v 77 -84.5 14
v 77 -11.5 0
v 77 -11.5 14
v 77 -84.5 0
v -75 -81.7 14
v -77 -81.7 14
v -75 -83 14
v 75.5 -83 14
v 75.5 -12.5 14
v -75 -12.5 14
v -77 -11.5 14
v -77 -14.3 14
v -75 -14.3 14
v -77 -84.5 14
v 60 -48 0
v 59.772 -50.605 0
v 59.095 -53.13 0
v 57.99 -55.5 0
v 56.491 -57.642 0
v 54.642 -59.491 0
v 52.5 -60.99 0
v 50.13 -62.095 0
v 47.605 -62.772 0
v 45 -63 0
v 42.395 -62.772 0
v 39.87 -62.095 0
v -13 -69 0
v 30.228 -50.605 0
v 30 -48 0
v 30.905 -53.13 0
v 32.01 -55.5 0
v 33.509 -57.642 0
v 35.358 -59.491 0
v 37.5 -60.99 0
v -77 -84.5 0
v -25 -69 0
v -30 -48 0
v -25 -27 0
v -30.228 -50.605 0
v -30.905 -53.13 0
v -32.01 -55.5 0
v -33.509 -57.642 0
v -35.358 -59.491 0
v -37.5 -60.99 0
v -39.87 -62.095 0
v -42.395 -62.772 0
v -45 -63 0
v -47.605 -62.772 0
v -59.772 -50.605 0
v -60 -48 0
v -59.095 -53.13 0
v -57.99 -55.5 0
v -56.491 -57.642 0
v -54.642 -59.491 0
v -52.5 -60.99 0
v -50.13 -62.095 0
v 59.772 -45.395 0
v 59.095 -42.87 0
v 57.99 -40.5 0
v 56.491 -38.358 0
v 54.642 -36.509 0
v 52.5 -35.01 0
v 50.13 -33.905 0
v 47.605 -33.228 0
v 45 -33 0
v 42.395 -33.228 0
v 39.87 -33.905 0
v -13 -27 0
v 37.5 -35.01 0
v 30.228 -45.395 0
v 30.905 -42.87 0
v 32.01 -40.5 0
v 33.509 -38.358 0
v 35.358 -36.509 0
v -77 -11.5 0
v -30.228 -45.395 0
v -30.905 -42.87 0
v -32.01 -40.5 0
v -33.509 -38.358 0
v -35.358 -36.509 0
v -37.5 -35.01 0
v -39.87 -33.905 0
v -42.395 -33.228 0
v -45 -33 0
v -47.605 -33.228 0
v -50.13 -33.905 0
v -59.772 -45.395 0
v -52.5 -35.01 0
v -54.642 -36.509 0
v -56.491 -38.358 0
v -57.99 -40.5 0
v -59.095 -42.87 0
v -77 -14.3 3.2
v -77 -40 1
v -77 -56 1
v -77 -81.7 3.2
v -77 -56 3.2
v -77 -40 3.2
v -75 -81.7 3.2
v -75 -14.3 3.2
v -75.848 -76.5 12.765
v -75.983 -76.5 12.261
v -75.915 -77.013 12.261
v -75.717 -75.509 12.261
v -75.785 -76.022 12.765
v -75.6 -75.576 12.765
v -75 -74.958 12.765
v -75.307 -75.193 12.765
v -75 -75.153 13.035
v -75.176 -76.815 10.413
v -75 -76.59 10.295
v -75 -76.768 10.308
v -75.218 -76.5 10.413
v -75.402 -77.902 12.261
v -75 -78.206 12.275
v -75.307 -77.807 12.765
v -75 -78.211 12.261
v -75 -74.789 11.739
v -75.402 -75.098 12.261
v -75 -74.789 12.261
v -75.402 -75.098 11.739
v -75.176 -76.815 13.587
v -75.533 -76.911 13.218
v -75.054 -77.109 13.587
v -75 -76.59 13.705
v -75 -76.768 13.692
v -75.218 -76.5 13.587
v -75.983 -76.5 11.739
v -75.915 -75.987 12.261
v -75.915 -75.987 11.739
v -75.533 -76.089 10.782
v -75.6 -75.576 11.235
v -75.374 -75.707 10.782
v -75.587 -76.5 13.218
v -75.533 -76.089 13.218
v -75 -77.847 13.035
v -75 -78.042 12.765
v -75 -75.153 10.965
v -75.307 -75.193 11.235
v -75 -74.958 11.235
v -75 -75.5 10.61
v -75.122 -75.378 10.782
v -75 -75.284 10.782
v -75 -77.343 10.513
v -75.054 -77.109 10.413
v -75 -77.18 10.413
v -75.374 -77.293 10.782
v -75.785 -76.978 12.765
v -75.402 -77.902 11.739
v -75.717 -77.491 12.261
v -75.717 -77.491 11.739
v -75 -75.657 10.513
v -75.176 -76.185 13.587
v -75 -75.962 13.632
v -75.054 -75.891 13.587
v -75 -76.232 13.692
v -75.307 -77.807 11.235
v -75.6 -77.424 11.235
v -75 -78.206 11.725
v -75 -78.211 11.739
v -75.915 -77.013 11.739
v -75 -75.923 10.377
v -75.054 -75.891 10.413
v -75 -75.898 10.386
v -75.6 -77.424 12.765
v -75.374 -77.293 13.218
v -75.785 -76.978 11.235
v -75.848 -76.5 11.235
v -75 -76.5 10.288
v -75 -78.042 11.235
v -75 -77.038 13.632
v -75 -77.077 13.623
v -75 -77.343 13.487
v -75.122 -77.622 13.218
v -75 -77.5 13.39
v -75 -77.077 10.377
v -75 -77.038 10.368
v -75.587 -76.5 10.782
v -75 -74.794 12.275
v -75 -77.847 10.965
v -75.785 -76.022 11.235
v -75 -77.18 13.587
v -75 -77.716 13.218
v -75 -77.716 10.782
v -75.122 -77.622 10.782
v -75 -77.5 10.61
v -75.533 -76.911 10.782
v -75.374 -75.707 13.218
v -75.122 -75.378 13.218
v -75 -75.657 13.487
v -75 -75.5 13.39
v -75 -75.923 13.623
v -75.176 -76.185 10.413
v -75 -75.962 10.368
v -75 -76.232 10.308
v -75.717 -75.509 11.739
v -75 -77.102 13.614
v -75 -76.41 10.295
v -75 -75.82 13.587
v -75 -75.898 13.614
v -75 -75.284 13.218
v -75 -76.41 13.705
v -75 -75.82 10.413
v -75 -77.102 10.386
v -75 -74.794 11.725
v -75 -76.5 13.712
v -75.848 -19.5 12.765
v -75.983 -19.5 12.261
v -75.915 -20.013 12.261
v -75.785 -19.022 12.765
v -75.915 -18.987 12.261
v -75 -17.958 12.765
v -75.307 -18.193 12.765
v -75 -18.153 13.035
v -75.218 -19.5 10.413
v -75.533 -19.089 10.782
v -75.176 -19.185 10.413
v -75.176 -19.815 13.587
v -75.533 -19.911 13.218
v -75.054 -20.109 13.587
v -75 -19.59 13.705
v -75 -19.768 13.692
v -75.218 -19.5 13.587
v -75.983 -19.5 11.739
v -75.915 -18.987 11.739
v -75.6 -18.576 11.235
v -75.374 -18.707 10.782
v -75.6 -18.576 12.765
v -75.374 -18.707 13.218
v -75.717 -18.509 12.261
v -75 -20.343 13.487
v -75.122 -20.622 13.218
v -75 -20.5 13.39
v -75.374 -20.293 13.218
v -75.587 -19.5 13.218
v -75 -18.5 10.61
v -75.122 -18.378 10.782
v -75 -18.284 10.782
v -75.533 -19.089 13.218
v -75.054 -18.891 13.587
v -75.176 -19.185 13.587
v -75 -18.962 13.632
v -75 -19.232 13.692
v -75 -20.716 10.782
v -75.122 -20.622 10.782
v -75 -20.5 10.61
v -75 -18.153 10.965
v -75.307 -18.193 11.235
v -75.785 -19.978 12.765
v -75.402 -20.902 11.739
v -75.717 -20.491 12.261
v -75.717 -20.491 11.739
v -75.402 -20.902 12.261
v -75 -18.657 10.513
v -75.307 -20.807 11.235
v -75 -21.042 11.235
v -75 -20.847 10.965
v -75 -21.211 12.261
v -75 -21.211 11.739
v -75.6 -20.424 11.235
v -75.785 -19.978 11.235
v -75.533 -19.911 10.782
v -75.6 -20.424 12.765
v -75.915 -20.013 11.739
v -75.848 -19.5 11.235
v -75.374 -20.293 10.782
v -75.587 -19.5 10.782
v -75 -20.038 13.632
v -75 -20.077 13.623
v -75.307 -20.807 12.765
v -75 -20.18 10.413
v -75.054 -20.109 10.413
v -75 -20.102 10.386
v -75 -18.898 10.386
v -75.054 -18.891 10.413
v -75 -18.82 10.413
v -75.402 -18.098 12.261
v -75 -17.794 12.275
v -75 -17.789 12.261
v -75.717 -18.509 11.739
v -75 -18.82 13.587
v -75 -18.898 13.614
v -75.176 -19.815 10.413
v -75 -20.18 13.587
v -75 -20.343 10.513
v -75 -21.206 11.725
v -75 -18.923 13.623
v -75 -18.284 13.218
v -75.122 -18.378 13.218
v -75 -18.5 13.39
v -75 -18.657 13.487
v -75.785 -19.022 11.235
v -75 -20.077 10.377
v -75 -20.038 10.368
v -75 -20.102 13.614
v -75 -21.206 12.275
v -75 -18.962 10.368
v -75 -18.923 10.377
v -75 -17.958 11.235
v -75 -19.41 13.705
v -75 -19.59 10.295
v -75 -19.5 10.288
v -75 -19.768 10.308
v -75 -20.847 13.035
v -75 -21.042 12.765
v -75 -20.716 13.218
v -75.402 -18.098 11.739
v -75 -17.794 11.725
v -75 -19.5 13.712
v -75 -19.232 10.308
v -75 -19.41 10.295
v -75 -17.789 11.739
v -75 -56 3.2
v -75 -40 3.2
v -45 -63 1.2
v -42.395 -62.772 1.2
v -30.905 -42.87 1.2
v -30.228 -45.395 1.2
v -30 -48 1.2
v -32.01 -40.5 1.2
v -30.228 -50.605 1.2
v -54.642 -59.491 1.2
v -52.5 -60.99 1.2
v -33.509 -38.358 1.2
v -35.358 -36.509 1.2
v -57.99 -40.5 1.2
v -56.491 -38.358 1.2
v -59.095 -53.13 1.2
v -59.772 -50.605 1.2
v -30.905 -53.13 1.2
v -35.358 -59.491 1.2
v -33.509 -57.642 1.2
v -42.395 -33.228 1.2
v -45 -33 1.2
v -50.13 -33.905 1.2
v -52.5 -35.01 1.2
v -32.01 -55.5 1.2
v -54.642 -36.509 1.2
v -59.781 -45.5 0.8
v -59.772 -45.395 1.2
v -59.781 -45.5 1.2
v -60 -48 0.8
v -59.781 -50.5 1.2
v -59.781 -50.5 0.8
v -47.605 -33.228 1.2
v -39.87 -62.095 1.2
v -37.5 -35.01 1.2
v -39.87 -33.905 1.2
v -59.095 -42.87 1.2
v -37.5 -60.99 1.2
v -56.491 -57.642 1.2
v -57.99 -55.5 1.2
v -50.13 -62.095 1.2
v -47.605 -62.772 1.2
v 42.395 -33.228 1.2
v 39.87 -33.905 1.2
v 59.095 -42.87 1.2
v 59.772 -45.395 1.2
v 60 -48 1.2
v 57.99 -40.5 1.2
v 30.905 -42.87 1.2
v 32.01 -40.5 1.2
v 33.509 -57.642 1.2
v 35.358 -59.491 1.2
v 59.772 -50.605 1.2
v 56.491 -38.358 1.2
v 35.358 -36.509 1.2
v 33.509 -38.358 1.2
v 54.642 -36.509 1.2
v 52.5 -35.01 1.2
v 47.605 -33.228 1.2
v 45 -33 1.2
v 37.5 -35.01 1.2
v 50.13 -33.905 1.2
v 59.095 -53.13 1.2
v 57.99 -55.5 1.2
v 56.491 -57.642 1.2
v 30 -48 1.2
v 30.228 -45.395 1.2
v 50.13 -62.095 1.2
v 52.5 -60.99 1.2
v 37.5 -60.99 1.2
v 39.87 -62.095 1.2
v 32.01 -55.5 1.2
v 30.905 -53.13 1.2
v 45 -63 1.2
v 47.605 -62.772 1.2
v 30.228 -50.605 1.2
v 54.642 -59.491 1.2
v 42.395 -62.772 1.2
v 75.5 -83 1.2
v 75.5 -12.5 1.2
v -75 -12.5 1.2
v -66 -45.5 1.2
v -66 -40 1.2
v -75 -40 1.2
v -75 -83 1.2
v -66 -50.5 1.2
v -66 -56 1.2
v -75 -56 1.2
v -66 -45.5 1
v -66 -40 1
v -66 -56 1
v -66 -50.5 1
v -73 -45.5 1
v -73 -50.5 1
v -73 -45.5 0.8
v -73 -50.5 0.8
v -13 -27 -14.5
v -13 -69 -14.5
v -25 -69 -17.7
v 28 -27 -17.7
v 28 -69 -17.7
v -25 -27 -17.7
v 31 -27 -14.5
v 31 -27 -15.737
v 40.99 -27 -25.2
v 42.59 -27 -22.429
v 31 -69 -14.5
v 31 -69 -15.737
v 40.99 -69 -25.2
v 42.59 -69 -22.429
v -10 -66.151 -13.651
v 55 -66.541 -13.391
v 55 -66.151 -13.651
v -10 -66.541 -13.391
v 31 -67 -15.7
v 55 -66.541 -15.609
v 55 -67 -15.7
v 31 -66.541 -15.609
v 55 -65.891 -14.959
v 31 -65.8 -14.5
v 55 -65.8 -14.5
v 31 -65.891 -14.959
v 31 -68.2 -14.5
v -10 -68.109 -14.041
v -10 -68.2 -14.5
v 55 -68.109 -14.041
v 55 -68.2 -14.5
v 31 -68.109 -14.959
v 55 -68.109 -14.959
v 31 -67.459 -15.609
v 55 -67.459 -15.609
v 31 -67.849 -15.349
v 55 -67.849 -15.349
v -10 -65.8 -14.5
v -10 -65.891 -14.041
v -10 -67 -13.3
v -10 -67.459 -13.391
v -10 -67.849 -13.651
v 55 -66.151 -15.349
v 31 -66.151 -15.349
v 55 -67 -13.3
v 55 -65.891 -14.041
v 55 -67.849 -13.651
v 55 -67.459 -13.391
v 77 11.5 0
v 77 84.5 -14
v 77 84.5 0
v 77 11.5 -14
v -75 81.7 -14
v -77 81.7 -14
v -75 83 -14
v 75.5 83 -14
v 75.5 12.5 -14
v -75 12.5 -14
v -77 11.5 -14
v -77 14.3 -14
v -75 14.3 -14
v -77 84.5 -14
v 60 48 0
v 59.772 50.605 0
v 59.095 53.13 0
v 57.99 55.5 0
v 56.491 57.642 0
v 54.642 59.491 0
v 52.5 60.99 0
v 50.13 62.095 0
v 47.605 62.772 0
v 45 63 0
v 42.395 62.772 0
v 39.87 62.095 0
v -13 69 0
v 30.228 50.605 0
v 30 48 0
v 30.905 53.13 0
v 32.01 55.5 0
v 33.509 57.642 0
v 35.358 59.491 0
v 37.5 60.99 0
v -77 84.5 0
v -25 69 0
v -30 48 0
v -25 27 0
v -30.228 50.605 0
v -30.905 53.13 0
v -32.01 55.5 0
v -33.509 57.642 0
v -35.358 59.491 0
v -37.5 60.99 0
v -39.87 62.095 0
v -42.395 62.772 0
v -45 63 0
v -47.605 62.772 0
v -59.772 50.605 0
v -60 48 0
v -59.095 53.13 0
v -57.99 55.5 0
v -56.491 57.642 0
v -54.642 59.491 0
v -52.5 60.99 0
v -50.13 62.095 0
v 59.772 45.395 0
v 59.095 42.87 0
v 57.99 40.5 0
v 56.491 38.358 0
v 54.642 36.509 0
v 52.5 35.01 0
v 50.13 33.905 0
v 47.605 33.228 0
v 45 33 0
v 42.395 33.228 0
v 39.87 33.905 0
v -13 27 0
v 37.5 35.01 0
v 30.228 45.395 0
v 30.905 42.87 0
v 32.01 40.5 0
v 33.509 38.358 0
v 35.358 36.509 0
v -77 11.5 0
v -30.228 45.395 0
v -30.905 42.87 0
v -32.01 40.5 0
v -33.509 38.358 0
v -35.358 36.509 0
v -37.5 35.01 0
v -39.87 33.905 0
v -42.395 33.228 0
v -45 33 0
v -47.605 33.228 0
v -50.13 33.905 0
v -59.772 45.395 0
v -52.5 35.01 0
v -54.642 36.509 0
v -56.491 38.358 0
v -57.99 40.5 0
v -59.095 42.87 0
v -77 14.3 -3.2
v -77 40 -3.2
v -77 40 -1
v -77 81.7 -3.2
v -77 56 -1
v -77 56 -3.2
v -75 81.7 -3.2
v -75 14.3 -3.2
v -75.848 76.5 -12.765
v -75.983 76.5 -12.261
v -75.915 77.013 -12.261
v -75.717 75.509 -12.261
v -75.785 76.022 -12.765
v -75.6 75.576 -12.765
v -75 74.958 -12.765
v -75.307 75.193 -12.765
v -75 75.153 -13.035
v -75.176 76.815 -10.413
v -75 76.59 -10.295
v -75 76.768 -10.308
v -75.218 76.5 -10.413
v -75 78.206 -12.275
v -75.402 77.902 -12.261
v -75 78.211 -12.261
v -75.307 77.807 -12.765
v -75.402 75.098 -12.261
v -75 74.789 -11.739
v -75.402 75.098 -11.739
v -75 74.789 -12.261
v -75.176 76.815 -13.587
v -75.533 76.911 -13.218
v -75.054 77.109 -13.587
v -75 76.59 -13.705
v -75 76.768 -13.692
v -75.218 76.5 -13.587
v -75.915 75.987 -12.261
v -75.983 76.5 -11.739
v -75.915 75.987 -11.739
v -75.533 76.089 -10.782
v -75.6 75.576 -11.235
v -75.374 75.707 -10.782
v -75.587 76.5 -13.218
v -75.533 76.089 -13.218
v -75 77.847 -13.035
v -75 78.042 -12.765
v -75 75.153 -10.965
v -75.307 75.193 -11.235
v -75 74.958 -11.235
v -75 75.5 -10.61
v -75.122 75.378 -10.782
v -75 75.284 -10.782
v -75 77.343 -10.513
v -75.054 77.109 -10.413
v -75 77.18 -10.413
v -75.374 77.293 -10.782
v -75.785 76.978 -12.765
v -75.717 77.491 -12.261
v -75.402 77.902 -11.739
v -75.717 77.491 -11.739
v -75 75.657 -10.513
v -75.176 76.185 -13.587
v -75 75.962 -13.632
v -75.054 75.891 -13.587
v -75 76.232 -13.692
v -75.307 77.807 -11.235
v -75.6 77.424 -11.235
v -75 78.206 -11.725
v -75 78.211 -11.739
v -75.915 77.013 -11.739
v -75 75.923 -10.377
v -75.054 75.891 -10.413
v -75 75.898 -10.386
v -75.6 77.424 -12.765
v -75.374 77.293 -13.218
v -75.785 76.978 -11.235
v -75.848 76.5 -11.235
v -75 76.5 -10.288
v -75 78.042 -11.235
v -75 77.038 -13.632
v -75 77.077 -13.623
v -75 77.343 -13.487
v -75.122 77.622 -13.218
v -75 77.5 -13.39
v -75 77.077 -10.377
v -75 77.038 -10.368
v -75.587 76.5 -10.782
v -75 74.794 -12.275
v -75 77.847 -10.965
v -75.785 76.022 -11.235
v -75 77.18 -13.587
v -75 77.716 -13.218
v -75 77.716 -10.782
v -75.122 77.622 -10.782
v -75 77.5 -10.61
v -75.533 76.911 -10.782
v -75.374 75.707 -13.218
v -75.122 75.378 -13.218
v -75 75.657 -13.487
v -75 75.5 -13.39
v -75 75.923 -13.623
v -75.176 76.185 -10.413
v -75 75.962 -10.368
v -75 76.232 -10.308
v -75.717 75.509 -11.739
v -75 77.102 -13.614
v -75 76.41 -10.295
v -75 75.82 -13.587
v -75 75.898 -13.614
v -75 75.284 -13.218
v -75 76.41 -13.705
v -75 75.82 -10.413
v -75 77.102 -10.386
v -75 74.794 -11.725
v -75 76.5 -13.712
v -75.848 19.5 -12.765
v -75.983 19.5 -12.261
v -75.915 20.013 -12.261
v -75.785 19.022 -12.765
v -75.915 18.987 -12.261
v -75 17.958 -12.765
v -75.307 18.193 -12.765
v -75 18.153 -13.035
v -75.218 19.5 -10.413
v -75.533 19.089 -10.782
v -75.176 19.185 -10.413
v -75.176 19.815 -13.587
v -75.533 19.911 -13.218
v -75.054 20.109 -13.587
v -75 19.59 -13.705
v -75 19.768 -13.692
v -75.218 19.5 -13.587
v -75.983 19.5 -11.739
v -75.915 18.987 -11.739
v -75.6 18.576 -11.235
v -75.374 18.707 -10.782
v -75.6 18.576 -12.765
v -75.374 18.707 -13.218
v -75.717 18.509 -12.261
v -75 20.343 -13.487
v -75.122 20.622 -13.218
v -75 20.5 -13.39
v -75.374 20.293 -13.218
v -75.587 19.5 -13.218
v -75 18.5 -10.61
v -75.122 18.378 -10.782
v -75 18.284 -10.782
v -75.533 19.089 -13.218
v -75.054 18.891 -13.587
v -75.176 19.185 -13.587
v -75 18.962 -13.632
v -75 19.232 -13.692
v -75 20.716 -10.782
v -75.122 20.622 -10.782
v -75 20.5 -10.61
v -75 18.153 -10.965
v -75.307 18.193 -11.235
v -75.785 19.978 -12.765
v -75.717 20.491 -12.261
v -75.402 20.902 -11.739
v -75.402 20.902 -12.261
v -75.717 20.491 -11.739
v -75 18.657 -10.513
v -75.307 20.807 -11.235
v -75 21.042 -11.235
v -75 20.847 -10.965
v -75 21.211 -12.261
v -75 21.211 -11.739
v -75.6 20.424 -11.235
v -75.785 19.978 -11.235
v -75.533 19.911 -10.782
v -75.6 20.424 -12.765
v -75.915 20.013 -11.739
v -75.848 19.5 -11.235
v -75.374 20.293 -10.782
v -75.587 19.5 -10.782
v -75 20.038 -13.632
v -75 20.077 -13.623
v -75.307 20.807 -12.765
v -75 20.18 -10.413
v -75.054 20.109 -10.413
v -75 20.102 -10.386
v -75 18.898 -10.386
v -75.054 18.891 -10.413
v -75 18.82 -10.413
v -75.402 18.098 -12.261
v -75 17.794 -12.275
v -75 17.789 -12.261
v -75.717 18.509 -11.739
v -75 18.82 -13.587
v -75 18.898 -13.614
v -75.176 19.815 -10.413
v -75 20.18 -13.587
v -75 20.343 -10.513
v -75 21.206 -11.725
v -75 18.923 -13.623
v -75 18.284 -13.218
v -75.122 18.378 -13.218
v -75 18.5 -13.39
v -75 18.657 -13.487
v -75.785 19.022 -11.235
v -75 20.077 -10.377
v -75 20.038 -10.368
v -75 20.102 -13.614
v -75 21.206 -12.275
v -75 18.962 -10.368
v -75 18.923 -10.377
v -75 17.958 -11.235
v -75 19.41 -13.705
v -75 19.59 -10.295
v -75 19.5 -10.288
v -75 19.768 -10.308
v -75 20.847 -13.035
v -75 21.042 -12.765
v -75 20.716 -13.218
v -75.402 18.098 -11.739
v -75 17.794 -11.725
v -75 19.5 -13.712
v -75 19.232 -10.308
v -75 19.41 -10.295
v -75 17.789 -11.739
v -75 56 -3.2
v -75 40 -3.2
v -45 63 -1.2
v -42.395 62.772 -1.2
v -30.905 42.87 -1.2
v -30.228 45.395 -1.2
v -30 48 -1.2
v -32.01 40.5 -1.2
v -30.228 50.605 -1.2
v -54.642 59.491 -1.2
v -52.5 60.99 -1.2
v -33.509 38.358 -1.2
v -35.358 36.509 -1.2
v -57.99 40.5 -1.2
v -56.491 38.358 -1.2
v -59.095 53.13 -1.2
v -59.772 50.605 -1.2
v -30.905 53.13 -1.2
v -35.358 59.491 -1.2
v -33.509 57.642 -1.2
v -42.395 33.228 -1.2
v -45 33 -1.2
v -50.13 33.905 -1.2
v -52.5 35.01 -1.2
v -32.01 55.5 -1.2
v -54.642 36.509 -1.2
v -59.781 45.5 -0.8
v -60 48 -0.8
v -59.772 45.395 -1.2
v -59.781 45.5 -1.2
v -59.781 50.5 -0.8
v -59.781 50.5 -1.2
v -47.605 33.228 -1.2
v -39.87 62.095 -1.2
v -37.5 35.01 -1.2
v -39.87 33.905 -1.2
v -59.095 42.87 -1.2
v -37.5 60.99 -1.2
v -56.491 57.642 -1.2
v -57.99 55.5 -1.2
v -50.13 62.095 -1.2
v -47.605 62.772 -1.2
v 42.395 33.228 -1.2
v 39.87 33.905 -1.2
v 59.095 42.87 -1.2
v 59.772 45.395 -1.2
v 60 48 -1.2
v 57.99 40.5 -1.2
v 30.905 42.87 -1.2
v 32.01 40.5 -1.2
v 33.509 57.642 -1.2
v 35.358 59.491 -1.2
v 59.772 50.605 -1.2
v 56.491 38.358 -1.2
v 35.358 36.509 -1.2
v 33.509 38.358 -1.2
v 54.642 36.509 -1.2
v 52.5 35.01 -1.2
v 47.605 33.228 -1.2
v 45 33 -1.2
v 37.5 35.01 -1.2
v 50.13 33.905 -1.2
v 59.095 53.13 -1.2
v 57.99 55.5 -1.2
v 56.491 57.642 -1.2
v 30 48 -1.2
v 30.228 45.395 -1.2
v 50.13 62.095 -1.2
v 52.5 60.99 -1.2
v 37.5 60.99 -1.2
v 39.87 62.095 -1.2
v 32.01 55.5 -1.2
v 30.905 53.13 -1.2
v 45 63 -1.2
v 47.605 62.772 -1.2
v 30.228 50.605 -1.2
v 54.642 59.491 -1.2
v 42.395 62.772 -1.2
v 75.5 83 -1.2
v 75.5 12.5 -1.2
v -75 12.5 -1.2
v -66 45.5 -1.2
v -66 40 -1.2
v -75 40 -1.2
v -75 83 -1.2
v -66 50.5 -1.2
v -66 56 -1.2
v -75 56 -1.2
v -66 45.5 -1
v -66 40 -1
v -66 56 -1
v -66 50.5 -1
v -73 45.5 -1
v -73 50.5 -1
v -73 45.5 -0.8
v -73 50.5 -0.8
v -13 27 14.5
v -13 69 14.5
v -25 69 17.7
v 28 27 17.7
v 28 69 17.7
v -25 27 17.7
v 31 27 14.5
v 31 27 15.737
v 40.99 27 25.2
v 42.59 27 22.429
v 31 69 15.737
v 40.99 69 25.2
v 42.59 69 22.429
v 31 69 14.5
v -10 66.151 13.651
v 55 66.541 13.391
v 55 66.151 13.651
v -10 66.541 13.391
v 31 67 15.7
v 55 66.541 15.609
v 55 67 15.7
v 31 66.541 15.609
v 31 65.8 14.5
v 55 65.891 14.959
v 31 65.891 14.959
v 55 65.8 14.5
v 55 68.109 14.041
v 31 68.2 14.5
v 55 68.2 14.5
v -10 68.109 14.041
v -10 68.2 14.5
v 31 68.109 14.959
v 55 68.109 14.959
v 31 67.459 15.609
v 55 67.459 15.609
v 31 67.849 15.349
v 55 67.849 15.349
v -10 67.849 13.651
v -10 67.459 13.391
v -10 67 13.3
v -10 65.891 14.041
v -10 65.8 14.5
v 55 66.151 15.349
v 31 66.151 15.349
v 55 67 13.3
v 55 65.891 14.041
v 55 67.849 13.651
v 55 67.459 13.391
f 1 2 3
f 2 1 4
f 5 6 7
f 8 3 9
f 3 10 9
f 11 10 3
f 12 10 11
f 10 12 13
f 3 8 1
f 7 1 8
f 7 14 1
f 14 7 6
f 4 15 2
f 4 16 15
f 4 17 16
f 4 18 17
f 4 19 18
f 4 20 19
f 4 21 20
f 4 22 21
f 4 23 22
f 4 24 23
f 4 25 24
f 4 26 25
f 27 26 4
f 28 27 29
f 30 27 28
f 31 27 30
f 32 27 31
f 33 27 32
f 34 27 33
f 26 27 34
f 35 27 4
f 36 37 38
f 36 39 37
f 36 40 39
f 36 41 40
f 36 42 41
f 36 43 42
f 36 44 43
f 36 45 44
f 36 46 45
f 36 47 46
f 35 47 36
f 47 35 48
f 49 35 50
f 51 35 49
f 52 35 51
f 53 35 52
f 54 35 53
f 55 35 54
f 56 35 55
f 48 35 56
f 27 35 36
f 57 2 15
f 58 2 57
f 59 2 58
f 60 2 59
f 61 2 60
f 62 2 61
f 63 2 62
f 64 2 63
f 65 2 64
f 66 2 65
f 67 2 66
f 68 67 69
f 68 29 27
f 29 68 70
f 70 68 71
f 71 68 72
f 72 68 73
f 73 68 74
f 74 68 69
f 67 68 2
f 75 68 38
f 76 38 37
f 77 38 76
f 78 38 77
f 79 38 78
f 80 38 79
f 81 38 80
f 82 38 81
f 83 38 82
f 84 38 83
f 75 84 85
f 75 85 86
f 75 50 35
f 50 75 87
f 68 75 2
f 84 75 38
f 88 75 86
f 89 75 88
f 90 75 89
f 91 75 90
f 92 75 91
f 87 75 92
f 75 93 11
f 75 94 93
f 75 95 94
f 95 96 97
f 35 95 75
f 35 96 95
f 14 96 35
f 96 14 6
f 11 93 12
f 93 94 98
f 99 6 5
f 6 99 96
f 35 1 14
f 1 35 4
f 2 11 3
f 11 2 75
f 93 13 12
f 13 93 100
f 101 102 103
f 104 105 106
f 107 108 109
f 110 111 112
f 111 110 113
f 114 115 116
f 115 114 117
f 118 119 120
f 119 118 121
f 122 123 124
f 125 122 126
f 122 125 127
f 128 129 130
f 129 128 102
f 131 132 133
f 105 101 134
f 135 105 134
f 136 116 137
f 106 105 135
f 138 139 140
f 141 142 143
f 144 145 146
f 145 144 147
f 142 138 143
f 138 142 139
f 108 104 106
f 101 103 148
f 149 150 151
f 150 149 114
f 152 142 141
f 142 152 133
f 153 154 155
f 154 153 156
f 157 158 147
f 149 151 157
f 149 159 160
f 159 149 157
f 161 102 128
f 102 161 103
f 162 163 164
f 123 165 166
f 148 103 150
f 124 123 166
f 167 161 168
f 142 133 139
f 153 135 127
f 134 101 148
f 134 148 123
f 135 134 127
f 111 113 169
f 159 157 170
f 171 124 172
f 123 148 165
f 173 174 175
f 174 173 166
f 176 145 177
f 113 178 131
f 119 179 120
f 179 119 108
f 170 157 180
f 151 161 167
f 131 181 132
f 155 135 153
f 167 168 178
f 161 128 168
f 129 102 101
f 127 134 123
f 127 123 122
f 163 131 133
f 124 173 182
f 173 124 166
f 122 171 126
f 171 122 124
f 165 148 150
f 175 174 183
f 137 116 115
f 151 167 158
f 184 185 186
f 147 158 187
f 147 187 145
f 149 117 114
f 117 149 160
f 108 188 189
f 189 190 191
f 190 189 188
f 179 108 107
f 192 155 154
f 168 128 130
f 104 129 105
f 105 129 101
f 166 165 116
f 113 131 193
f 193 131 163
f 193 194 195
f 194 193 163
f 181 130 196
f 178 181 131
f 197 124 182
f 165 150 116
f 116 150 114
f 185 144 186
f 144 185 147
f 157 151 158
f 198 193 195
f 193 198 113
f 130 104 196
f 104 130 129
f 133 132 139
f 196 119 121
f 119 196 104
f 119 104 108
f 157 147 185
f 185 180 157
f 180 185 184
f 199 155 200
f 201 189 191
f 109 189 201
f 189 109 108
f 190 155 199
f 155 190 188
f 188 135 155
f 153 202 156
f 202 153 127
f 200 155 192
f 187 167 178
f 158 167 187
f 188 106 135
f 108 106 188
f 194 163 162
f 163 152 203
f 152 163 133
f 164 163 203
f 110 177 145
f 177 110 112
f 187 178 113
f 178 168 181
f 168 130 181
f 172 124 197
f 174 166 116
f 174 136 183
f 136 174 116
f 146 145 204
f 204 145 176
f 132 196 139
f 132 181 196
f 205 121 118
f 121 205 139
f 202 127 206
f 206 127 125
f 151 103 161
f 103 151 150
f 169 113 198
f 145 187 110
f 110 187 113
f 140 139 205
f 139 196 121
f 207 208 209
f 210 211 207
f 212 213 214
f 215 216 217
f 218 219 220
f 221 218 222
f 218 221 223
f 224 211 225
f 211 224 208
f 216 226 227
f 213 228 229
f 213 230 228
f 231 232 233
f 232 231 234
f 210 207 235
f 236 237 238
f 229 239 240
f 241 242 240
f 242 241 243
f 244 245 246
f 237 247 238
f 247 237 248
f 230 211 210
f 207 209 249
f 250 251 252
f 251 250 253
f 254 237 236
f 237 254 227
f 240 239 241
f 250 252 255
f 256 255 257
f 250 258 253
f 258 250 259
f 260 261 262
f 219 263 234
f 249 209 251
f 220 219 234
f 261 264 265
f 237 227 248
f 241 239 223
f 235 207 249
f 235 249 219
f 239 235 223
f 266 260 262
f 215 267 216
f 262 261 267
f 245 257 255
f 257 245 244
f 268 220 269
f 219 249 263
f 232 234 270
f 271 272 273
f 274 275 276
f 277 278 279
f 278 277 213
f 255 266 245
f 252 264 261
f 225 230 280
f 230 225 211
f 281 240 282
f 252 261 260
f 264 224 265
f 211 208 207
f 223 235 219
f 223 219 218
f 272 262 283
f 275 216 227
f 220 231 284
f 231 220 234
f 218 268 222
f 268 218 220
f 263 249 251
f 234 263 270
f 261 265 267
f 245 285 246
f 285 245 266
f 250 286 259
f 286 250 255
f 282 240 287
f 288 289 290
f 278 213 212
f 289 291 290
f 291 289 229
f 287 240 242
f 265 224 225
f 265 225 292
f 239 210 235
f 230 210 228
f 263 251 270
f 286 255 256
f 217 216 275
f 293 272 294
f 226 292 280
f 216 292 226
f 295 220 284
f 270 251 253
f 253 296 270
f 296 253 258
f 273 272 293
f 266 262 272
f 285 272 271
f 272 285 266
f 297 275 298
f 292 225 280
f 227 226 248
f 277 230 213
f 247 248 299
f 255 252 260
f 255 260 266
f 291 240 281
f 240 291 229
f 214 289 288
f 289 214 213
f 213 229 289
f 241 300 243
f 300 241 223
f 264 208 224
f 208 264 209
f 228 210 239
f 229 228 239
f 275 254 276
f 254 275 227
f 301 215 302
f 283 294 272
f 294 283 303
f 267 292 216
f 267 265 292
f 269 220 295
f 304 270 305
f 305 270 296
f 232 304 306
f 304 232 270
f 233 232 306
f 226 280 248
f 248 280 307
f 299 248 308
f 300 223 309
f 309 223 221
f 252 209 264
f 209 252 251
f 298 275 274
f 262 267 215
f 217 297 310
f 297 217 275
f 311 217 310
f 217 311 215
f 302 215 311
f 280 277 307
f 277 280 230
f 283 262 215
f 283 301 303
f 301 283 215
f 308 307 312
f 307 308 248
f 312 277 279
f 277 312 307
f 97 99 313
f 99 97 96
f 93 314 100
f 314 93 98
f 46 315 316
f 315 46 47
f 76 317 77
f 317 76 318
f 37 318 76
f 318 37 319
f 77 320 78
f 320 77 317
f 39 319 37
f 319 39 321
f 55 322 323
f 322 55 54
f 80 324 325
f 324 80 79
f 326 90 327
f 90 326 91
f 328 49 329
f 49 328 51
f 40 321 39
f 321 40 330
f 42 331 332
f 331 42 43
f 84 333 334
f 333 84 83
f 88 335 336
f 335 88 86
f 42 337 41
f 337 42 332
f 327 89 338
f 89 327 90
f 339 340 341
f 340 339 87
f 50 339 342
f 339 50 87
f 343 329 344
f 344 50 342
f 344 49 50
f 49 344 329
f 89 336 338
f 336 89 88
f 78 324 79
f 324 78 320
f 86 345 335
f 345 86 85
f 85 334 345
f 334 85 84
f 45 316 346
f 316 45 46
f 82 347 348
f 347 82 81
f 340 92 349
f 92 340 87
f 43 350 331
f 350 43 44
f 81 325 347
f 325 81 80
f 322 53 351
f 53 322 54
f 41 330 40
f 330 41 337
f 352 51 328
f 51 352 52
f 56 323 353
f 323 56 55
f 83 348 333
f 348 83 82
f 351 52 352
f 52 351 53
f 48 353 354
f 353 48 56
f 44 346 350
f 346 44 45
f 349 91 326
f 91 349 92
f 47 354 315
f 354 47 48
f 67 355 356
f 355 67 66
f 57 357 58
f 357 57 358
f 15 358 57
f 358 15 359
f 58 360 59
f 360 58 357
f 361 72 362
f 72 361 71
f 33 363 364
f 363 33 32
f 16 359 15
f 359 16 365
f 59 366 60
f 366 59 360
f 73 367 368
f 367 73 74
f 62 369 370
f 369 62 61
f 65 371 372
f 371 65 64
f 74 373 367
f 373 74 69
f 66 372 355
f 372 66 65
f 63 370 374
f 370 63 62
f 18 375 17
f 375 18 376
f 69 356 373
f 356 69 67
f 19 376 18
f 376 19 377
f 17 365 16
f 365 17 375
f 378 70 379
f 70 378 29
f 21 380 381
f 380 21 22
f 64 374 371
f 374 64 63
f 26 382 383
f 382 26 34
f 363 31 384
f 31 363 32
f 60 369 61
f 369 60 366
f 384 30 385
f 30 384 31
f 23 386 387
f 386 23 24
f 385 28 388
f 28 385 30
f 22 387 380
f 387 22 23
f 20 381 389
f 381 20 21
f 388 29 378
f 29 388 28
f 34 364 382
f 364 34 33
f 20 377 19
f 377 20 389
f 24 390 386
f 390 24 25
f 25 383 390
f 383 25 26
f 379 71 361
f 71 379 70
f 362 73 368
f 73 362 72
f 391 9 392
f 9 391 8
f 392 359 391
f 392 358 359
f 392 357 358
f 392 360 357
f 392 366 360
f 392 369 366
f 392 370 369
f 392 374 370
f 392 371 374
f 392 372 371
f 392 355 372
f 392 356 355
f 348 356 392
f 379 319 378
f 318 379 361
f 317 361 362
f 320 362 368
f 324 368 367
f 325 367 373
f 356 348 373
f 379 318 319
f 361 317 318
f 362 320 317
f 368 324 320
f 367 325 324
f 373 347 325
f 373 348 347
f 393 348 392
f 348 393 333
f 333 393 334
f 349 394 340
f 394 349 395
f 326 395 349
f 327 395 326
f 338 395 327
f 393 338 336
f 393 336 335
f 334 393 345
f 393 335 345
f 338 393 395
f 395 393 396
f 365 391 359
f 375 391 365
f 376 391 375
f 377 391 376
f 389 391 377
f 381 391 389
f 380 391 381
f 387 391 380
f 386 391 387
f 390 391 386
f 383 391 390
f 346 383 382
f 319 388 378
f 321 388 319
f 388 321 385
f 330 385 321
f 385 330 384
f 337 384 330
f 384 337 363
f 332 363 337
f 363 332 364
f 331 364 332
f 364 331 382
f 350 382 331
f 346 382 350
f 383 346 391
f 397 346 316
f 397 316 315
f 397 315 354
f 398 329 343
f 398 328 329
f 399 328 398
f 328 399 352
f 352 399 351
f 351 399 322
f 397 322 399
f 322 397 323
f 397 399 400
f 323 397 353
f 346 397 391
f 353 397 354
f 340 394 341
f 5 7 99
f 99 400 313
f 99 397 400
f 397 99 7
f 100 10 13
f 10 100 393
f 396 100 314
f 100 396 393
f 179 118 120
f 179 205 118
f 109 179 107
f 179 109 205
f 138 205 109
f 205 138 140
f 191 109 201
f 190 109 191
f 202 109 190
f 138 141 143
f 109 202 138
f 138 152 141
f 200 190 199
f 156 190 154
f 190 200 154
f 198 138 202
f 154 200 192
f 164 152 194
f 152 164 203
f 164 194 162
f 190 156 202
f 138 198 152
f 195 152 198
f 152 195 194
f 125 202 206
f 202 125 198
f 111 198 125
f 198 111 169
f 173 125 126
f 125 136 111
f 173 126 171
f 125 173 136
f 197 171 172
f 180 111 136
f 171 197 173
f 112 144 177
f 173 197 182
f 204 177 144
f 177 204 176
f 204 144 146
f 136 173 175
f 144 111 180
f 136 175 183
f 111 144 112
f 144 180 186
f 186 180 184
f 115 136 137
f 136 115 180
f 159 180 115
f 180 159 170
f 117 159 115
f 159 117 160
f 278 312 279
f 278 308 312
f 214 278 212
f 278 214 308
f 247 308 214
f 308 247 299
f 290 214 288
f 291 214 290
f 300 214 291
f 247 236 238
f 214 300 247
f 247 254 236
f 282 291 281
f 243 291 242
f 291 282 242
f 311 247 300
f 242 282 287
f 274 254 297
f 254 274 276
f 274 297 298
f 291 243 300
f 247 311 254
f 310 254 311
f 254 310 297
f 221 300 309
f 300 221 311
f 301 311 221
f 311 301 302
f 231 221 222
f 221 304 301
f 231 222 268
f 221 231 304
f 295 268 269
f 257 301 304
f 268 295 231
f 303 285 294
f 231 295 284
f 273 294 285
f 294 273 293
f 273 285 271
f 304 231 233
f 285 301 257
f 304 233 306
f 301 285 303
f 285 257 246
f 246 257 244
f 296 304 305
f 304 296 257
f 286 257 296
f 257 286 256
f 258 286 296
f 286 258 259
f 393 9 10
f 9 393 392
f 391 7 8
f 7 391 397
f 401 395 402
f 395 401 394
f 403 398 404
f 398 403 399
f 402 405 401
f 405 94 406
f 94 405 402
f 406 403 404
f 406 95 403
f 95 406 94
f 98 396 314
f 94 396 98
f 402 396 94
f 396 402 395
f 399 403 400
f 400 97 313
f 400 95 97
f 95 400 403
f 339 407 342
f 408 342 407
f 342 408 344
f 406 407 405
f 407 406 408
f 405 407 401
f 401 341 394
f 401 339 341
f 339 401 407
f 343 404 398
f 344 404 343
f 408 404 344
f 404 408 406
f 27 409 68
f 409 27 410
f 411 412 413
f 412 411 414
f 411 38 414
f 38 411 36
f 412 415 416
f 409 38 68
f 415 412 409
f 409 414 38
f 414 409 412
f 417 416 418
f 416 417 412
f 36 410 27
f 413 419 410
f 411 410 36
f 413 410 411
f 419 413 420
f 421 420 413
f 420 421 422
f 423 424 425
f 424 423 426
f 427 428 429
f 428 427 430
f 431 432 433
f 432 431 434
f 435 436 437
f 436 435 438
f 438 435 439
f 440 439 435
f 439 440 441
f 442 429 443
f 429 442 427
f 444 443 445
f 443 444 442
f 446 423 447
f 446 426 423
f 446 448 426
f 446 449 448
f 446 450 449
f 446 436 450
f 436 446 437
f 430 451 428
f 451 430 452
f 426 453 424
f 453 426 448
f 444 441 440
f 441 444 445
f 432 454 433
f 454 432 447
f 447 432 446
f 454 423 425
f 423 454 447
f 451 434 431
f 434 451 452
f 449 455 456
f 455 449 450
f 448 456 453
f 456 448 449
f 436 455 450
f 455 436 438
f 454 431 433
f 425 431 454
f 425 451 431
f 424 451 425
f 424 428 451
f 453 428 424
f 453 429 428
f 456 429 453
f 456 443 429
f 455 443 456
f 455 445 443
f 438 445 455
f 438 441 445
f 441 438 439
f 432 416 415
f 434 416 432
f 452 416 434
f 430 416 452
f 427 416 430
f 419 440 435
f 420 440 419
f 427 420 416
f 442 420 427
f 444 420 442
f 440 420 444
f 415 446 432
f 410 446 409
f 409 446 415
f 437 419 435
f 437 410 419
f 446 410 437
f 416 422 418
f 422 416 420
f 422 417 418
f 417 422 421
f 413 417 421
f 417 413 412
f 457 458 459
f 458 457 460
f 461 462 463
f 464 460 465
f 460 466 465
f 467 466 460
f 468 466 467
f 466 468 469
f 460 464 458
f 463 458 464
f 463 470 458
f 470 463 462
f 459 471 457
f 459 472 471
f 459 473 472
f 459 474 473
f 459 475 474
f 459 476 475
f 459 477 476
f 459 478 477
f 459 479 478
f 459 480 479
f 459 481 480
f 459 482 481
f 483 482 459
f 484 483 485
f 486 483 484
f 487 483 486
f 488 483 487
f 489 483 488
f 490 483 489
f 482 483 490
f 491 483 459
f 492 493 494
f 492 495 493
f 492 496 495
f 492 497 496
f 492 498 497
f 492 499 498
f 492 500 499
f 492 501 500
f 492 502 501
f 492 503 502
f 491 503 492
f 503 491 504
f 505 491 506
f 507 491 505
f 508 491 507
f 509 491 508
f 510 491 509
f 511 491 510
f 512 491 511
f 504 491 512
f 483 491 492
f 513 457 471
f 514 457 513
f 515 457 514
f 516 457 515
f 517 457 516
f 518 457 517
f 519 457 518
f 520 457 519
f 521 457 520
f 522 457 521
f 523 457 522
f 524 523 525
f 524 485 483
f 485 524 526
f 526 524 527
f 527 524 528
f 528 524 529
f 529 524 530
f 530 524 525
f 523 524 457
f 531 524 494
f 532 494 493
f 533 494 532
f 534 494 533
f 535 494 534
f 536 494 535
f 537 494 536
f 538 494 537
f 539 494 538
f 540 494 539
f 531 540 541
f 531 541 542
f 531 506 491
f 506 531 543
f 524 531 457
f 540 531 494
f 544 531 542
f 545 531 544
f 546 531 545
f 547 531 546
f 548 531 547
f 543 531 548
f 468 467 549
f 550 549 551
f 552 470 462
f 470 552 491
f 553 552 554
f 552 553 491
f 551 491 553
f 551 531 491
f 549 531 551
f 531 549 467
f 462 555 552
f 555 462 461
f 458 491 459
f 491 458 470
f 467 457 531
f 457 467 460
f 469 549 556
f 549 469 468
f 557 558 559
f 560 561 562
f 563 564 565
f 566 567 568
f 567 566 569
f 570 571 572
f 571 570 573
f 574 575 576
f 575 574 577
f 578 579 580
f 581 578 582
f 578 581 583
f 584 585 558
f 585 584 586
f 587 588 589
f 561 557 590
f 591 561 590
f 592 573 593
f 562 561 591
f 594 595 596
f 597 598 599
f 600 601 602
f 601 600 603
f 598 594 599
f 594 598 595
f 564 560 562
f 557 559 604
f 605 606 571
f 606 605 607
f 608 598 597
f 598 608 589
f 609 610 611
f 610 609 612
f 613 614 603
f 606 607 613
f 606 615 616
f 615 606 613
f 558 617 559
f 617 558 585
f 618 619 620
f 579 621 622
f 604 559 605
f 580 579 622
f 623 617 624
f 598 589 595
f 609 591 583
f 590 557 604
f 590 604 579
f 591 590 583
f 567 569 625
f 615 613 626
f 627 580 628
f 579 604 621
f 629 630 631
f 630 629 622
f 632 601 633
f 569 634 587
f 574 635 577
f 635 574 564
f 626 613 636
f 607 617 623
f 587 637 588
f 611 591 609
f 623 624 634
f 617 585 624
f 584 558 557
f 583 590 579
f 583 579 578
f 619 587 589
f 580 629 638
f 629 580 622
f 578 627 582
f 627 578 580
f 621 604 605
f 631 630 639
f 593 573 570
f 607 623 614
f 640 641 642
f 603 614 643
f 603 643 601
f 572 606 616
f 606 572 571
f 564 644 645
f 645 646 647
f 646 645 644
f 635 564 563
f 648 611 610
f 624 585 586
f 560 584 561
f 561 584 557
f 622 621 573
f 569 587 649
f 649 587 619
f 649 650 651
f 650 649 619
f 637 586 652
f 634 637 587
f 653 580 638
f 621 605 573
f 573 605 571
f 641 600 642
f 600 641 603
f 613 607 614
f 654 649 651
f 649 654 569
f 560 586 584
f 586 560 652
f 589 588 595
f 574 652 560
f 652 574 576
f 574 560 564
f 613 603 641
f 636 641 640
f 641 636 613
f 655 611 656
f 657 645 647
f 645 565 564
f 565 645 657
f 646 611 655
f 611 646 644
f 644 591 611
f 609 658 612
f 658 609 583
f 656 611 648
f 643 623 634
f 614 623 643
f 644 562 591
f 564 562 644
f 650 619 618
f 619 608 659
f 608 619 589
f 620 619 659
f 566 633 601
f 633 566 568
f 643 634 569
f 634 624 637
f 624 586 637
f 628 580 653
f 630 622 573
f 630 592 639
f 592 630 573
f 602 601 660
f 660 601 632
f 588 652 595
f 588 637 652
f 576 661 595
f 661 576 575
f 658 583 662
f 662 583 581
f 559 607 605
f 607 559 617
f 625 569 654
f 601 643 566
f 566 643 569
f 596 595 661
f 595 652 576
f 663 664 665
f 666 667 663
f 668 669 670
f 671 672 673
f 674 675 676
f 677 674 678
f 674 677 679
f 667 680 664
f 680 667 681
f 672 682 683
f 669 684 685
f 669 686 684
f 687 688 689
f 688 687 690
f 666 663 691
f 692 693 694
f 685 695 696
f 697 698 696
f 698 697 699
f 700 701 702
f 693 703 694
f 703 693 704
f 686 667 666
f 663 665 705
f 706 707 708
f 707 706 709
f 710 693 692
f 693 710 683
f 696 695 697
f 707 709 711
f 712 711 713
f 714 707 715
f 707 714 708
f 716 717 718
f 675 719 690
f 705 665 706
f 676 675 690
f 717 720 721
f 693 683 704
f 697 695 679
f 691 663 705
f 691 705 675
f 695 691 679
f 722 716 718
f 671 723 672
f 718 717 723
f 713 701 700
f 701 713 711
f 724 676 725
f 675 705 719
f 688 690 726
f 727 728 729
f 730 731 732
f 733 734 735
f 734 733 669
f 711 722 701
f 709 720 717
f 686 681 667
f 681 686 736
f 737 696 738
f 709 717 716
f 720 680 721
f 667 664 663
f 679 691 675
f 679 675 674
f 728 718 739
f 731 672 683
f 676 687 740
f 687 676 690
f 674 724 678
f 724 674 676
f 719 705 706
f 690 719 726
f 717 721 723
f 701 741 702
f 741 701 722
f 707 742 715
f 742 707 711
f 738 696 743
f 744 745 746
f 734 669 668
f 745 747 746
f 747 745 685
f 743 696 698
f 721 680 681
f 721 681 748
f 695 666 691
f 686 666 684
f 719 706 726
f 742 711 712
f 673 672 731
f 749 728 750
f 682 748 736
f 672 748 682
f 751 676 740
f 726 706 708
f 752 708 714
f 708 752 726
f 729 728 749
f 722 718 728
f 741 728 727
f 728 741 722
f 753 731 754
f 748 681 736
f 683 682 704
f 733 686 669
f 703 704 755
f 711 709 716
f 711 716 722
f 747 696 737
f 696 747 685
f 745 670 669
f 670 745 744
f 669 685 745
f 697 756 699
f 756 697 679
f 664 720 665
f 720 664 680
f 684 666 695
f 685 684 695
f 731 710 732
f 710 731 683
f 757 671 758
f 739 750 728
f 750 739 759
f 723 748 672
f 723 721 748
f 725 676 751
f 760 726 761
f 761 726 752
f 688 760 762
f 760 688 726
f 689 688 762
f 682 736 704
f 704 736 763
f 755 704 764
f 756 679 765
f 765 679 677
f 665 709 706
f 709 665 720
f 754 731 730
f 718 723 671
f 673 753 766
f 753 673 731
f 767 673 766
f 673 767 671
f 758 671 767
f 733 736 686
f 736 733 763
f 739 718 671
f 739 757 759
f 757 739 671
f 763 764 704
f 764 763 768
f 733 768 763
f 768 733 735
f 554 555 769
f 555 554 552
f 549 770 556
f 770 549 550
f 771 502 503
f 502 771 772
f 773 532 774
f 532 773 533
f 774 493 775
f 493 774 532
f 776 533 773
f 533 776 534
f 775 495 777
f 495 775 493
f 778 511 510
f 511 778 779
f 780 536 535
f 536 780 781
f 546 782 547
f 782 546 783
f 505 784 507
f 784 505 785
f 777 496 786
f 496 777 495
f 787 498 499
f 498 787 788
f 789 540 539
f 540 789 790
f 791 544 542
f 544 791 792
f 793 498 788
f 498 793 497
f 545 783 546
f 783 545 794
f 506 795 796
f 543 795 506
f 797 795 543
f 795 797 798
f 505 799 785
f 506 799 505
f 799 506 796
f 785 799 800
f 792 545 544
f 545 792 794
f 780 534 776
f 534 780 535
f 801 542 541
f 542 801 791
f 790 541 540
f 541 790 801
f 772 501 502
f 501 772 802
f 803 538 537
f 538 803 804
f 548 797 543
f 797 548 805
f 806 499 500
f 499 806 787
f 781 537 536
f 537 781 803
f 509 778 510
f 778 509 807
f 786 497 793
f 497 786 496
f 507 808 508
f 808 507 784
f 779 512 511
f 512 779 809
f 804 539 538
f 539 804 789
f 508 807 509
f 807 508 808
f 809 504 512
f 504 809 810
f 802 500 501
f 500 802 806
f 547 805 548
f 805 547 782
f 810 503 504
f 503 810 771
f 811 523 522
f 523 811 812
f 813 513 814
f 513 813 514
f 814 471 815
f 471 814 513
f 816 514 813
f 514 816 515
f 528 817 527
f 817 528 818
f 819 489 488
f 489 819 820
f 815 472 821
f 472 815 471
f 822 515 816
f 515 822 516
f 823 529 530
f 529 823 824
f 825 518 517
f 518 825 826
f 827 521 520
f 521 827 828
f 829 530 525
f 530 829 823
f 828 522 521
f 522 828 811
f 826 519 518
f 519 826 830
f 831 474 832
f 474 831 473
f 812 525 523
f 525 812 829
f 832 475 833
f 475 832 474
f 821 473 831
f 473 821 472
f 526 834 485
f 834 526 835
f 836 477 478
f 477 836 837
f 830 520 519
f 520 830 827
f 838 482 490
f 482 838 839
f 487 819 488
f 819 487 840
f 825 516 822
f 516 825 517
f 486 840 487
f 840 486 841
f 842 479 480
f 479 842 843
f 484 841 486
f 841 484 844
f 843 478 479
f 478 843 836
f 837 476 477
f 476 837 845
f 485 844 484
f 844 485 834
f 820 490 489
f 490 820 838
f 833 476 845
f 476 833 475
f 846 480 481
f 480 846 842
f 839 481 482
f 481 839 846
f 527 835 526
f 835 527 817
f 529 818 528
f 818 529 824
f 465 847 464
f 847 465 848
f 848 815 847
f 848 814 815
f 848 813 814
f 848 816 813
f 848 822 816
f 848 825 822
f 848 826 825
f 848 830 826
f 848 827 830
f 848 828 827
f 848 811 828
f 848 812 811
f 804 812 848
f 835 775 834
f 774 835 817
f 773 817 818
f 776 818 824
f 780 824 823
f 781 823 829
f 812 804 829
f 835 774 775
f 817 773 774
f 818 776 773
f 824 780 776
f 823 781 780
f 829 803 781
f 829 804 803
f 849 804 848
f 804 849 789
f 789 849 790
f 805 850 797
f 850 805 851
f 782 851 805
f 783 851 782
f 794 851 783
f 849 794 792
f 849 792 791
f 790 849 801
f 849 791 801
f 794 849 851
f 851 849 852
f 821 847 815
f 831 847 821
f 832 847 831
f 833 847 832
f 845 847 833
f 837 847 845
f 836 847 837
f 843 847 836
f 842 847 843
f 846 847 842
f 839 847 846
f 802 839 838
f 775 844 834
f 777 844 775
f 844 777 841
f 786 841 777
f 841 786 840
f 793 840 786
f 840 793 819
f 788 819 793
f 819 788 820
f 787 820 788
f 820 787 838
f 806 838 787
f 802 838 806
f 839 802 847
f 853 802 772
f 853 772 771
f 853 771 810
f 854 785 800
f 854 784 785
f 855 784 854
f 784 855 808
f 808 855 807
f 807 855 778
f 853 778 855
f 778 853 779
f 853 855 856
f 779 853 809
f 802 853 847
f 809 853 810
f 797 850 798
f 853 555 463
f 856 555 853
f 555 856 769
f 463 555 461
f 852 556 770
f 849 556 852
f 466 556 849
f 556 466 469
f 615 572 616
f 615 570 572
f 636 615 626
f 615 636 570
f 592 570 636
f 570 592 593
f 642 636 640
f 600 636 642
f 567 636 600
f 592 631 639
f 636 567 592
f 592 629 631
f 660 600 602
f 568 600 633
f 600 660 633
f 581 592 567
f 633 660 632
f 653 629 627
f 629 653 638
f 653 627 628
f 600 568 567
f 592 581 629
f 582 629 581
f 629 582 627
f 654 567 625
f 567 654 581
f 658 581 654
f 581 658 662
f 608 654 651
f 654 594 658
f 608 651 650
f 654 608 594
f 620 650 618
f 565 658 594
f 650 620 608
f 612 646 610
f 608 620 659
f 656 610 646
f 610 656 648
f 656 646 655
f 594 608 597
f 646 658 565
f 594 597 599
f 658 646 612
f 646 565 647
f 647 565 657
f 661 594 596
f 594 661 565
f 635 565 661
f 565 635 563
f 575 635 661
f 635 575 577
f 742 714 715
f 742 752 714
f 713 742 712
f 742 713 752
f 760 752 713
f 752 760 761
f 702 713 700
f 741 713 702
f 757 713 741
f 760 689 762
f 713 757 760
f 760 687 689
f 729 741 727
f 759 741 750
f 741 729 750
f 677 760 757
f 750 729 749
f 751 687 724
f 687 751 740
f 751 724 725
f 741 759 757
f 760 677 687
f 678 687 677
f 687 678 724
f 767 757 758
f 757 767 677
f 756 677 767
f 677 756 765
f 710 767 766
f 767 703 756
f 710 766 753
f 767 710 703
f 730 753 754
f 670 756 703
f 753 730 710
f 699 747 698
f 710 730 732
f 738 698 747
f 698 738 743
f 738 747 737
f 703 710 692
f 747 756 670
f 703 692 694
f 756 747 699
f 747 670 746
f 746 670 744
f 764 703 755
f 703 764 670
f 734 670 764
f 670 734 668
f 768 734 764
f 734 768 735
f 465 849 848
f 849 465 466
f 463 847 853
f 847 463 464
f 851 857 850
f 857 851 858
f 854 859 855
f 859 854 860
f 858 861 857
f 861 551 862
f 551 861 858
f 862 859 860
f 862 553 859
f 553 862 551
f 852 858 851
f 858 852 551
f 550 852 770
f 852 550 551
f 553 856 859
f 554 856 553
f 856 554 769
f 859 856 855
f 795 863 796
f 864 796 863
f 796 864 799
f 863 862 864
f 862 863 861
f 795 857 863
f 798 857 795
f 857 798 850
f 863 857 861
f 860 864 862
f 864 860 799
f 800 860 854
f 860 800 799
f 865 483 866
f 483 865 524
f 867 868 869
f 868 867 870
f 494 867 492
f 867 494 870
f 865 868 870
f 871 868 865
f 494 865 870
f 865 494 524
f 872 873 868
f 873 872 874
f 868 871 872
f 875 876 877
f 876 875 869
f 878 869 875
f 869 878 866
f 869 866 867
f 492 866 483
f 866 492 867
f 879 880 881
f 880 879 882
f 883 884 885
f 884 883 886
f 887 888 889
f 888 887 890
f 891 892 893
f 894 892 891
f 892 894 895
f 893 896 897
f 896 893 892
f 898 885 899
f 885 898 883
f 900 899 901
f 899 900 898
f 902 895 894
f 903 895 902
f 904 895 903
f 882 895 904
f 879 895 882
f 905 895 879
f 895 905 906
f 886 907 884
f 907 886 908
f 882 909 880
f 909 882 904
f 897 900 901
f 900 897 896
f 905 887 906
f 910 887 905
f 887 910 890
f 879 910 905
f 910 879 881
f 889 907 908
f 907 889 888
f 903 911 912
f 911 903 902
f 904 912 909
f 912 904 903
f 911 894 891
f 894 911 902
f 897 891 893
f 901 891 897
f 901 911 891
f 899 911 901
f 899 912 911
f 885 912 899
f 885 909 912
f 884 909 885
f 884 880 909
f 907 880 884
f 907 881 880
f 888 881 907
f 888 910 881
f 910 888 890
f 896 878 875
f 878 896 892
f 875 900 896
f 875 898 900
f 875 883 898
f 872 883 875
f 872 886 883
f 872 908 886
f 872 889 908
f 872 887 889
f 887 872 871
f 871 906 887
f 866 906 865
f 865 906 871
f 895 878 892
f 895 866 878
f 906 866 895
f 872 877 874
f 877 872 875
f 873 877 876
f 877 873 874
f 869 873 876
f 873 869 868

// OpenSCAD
// =============================================================================
// OpenMotorBridge - Universal Car Sun Visor Mount for Satellite Pod 3
// =============================================================================
// File: hardware/cad/scad/05_accessories/car_sun_visor_pod3_clip.scad
// Description: Universal automotive mounting clip for Pod 3 (GNSS, LoRa, 5.9GHz V2X):
//              1. Attaches securely to passenger sun visor in ANY vehicle type
//                 (Station wagon, SUV, hatchback, sports coupe, sedan).
//              2. Bypasses bulky windshield ADAS / camera boxes behind the rear-view mirror.
//              3. Optimal 180° skyward RF view through top windshield zone.
//              4. Tool-free 5-minute cable run directly into the roof headliner seam.
//              5. Non-marring compliant spring clamp jaws (14 .. 22 mm visor thickness)
//                 located strictly on the exterior underside of the cradle.
//              6. Completely unobstructed upper docking cradle cavity for Pod 3.
//              7. Low-profile stealth look (resembles an electronic toll tag / transponder).
// =============================================================================

include <../00_common/parameters.scad>;

// --- Parametric Visor Clamp Dimensions ---
VISOR_THICK_NOM     = 18.0;  // Nominal sun visor thickness (mm)
VISOR_CLAMP_GAP     = 14.5;  // Inner clamping gap at rest for firm friction grip (mm)
VISOR_CLAMP_DEPTH   = 58.0;  // Clamping reach over visor body (mm)
VISOR_CLAMP_WIDTH   = 42.0;  // Clamp tongue width in Y (mm)
CLAMP_SPRING_THICK  = 3.2;   // Spring leaf thickness (PETG / PA12 flexible spring)

// --- Pod 1 & 2 Docking Cradle Dimensions (Universal 150mm Envelope) ---
CRADLE_L            = POD_OUTER_L + 4.0;  // 154.0 mm (clears 150mm enlarged pod)
CRADLE_W            = POD_OUTER_W + 3.0;  // 73.0 mm (clears 70mm pod width)
CRADLE_WALL         = 2.8;                // Sidewall thickness (mm)
CRADLE_LIP_H        = 14.0;               // Side retention lip height (mm)

module sun_visor_spring_tongue() {
    // Compliant spring clamp leaf located strictly in negative Z (underside of cradle)
    translate([0, 0, -(VISOR_CLAMP_GAP + CLAMP_SPRING_THICK)]) {
        // Main clamping leaf span
        hull() {
            // Root junction
            translate([0, -VISOR_CLAMP_WIDTH/2.0, 0])
                cube([8.0, VISOR_CLAMP_WIDTH, CLAMP_SPRING_THICK], center=false);
            // Extended clamping arm
            translate([VISOR_CLAMP_DEPTH - 12.0, -VISOR_CLAMP_WIDTH/2.0, 0])
                cube([10.0, VISOR_CLAMP_WIDTH, CLAMP_SPRING_THICK], center=false);
        }

        // Upturned/flared lead-in lip for easy one-handed push onto visor
        translate([VISOR_CLAMP_DEPTH - 5.0, -VISOR_CLAMP_WIDTH/2.0, 0]) {
            rotate([0, 30, 0])
                cube([15.0, VISOR_CLAMP_WIDTH, CLAMP_SPRING_THICK], center=false);
        }

        // Non-marring soft grip friction ribs (3x transverse rounded ridges)
        for (rx = [15.0, 28.0, 42.0]) {
            translate([rx, -VISOR_CLAMP_WIDTH/2.0 + 2.0, CLAMP_SPRING_THICK])
                rotate([0, 90, 0])
                    cylinder(r=1.2, h=VISOR_CLAMP_WIDTH - 4.0, center=false, $fn=16);
        }
    }
}

module pod3_docking_cradle() {
    difference() {
        union() {
            // Main cradle floor plate
            translate([-CRADLE_L/2.0, -CRADLE_W/2.0, 0])
                cube([CRADLE_L, CRADLE_W, 3.2], center=false);

            // Left & Right retention sidewalls with Pod 3 strap-lug lock pockets
            for (side = [-CRADLE_W/2.0, CRADLE_W/2.0 - CRADLE_WALL]) {
                translate([-CRADLE_L/2.0, side, 0]) {
                    cube([CRADLE_L, CRADLE_WALL, CRADLE_LIP_H], center=false);
                }
            }

            // Front stop lip
            translate([CRADLE_L/2.0 - CRADLE_WALL, -CRADLE_W/2.0, 0])
                cube([CRADLE_WALL, CRADLE_W, CRADLE_LIP_H], center=false);

            // Rear snap detents (click into Pod 3 housing corner fillets)
            for (dy = [-CRADLE_W/2.0 + 8.0, CRADLE_W/2.0 - 8.0]) {
                translate([-CRADLE_L/2.0 + 3.0, dy, CRADLE_LIP_H - 2.0])
                    sphere(r=2.0, $fn=24);
            }
        }

        // --- SUBTRACTIONS (100% unobstructed internal cavity) ---

        // 1. Pod 3 Main Bed Recess (135 x 70 mm clearance)
        translate([-POD_OUTER_L/2.0, -POD_OUTER_W/2.0, 1.2])
            cube([POD_OUTER_L + 0.5, POD_OUTER_W + 0.5, CRADLE_LIP_H + 2.0], center=false);

        // 2. Headliner Cable Exit Channel (Directs USB-C cable up towards roof seam)
        translate([-CRADLE_L/2.0 - 1.0, -8.0, 1.0])
            cube([12.0, 16.0, 8.0], center=false);

        // Cable clip grooves along rear spine
        translate([-CRADLE_L/2.0 + 4.0, -2.5, 0.8])
            cube([20.0, 5.0, 6.0], center=false);

        // 3. Weight reduction cutouts in floor plate (outside clamping footprint)
        for (dx = [-45.0, 45.0]) {
            translate([dx, 0, -1.0])
                cylinder(r=15.0, h=6.0, center=true, $fn=36);
        }
    }
}

module car_sun_visor_pod3_clip() {
    // 1. Upper Pod 3 Docking Bed (in +Z: 0 .. +14 mm)
    pod3_docking_cradle();

    // 2. Robust Underside Spine & Visor Clamp Bridge (in -Z: 0 .. -18 mm)
    // The spine drops down from the bottom of the cradle floor to the spring tongue
    translate([-25.0, -VISOR_CLAMP_WIDTH/2.0, -(VISOR_CLAMP_GAP + CLAMP_SPRING_THICK)]) {
        difference() {
            // Solid U-channel bridge
            cube([12.0, VISOR_CLAMP_WIDTH, VISOR_CLAMP_GAP + CLAMP_SPRING_THICK + 0.1], center=false);
            // Generous inner fillet relief
            translate([12.0, -1.0, VISOR_CLAMP_GAP + CLAMP_SPRING_THICK])
                rotate([0, 45, 0])
                    cube([8.0, VISOR_CLAMP_WIDTH + 2.0, 8.0], center=false);
        }
    }

    // 3. Compliant Visor Spring Tongue (in -Z, runs parallel to cradle bottom)
    translate([-25.0, 0, 0])
        sun_visor_spring_tongue();
}

// --- Parametric Render / Export Modes ---
part = "assembly"; // ["assembly", "single"]

if (part == "assembly") {
    // Top cradle perspective (shows Pod 3 docking cavity, snap detents & cable exit)
    translate([0, -48.0, 0])
        car_sun_visor_pod3_clip();

    // Underside perspective (shows visor clamp jaw, clamping gap, ridges & lead-in lip)
    translate([0, 48.0, 0])
        rotate([180, 0, 0])
            car_sun_visor_pod3_clip();
} else {
    car_sun_visor_pod3_clip();
}
